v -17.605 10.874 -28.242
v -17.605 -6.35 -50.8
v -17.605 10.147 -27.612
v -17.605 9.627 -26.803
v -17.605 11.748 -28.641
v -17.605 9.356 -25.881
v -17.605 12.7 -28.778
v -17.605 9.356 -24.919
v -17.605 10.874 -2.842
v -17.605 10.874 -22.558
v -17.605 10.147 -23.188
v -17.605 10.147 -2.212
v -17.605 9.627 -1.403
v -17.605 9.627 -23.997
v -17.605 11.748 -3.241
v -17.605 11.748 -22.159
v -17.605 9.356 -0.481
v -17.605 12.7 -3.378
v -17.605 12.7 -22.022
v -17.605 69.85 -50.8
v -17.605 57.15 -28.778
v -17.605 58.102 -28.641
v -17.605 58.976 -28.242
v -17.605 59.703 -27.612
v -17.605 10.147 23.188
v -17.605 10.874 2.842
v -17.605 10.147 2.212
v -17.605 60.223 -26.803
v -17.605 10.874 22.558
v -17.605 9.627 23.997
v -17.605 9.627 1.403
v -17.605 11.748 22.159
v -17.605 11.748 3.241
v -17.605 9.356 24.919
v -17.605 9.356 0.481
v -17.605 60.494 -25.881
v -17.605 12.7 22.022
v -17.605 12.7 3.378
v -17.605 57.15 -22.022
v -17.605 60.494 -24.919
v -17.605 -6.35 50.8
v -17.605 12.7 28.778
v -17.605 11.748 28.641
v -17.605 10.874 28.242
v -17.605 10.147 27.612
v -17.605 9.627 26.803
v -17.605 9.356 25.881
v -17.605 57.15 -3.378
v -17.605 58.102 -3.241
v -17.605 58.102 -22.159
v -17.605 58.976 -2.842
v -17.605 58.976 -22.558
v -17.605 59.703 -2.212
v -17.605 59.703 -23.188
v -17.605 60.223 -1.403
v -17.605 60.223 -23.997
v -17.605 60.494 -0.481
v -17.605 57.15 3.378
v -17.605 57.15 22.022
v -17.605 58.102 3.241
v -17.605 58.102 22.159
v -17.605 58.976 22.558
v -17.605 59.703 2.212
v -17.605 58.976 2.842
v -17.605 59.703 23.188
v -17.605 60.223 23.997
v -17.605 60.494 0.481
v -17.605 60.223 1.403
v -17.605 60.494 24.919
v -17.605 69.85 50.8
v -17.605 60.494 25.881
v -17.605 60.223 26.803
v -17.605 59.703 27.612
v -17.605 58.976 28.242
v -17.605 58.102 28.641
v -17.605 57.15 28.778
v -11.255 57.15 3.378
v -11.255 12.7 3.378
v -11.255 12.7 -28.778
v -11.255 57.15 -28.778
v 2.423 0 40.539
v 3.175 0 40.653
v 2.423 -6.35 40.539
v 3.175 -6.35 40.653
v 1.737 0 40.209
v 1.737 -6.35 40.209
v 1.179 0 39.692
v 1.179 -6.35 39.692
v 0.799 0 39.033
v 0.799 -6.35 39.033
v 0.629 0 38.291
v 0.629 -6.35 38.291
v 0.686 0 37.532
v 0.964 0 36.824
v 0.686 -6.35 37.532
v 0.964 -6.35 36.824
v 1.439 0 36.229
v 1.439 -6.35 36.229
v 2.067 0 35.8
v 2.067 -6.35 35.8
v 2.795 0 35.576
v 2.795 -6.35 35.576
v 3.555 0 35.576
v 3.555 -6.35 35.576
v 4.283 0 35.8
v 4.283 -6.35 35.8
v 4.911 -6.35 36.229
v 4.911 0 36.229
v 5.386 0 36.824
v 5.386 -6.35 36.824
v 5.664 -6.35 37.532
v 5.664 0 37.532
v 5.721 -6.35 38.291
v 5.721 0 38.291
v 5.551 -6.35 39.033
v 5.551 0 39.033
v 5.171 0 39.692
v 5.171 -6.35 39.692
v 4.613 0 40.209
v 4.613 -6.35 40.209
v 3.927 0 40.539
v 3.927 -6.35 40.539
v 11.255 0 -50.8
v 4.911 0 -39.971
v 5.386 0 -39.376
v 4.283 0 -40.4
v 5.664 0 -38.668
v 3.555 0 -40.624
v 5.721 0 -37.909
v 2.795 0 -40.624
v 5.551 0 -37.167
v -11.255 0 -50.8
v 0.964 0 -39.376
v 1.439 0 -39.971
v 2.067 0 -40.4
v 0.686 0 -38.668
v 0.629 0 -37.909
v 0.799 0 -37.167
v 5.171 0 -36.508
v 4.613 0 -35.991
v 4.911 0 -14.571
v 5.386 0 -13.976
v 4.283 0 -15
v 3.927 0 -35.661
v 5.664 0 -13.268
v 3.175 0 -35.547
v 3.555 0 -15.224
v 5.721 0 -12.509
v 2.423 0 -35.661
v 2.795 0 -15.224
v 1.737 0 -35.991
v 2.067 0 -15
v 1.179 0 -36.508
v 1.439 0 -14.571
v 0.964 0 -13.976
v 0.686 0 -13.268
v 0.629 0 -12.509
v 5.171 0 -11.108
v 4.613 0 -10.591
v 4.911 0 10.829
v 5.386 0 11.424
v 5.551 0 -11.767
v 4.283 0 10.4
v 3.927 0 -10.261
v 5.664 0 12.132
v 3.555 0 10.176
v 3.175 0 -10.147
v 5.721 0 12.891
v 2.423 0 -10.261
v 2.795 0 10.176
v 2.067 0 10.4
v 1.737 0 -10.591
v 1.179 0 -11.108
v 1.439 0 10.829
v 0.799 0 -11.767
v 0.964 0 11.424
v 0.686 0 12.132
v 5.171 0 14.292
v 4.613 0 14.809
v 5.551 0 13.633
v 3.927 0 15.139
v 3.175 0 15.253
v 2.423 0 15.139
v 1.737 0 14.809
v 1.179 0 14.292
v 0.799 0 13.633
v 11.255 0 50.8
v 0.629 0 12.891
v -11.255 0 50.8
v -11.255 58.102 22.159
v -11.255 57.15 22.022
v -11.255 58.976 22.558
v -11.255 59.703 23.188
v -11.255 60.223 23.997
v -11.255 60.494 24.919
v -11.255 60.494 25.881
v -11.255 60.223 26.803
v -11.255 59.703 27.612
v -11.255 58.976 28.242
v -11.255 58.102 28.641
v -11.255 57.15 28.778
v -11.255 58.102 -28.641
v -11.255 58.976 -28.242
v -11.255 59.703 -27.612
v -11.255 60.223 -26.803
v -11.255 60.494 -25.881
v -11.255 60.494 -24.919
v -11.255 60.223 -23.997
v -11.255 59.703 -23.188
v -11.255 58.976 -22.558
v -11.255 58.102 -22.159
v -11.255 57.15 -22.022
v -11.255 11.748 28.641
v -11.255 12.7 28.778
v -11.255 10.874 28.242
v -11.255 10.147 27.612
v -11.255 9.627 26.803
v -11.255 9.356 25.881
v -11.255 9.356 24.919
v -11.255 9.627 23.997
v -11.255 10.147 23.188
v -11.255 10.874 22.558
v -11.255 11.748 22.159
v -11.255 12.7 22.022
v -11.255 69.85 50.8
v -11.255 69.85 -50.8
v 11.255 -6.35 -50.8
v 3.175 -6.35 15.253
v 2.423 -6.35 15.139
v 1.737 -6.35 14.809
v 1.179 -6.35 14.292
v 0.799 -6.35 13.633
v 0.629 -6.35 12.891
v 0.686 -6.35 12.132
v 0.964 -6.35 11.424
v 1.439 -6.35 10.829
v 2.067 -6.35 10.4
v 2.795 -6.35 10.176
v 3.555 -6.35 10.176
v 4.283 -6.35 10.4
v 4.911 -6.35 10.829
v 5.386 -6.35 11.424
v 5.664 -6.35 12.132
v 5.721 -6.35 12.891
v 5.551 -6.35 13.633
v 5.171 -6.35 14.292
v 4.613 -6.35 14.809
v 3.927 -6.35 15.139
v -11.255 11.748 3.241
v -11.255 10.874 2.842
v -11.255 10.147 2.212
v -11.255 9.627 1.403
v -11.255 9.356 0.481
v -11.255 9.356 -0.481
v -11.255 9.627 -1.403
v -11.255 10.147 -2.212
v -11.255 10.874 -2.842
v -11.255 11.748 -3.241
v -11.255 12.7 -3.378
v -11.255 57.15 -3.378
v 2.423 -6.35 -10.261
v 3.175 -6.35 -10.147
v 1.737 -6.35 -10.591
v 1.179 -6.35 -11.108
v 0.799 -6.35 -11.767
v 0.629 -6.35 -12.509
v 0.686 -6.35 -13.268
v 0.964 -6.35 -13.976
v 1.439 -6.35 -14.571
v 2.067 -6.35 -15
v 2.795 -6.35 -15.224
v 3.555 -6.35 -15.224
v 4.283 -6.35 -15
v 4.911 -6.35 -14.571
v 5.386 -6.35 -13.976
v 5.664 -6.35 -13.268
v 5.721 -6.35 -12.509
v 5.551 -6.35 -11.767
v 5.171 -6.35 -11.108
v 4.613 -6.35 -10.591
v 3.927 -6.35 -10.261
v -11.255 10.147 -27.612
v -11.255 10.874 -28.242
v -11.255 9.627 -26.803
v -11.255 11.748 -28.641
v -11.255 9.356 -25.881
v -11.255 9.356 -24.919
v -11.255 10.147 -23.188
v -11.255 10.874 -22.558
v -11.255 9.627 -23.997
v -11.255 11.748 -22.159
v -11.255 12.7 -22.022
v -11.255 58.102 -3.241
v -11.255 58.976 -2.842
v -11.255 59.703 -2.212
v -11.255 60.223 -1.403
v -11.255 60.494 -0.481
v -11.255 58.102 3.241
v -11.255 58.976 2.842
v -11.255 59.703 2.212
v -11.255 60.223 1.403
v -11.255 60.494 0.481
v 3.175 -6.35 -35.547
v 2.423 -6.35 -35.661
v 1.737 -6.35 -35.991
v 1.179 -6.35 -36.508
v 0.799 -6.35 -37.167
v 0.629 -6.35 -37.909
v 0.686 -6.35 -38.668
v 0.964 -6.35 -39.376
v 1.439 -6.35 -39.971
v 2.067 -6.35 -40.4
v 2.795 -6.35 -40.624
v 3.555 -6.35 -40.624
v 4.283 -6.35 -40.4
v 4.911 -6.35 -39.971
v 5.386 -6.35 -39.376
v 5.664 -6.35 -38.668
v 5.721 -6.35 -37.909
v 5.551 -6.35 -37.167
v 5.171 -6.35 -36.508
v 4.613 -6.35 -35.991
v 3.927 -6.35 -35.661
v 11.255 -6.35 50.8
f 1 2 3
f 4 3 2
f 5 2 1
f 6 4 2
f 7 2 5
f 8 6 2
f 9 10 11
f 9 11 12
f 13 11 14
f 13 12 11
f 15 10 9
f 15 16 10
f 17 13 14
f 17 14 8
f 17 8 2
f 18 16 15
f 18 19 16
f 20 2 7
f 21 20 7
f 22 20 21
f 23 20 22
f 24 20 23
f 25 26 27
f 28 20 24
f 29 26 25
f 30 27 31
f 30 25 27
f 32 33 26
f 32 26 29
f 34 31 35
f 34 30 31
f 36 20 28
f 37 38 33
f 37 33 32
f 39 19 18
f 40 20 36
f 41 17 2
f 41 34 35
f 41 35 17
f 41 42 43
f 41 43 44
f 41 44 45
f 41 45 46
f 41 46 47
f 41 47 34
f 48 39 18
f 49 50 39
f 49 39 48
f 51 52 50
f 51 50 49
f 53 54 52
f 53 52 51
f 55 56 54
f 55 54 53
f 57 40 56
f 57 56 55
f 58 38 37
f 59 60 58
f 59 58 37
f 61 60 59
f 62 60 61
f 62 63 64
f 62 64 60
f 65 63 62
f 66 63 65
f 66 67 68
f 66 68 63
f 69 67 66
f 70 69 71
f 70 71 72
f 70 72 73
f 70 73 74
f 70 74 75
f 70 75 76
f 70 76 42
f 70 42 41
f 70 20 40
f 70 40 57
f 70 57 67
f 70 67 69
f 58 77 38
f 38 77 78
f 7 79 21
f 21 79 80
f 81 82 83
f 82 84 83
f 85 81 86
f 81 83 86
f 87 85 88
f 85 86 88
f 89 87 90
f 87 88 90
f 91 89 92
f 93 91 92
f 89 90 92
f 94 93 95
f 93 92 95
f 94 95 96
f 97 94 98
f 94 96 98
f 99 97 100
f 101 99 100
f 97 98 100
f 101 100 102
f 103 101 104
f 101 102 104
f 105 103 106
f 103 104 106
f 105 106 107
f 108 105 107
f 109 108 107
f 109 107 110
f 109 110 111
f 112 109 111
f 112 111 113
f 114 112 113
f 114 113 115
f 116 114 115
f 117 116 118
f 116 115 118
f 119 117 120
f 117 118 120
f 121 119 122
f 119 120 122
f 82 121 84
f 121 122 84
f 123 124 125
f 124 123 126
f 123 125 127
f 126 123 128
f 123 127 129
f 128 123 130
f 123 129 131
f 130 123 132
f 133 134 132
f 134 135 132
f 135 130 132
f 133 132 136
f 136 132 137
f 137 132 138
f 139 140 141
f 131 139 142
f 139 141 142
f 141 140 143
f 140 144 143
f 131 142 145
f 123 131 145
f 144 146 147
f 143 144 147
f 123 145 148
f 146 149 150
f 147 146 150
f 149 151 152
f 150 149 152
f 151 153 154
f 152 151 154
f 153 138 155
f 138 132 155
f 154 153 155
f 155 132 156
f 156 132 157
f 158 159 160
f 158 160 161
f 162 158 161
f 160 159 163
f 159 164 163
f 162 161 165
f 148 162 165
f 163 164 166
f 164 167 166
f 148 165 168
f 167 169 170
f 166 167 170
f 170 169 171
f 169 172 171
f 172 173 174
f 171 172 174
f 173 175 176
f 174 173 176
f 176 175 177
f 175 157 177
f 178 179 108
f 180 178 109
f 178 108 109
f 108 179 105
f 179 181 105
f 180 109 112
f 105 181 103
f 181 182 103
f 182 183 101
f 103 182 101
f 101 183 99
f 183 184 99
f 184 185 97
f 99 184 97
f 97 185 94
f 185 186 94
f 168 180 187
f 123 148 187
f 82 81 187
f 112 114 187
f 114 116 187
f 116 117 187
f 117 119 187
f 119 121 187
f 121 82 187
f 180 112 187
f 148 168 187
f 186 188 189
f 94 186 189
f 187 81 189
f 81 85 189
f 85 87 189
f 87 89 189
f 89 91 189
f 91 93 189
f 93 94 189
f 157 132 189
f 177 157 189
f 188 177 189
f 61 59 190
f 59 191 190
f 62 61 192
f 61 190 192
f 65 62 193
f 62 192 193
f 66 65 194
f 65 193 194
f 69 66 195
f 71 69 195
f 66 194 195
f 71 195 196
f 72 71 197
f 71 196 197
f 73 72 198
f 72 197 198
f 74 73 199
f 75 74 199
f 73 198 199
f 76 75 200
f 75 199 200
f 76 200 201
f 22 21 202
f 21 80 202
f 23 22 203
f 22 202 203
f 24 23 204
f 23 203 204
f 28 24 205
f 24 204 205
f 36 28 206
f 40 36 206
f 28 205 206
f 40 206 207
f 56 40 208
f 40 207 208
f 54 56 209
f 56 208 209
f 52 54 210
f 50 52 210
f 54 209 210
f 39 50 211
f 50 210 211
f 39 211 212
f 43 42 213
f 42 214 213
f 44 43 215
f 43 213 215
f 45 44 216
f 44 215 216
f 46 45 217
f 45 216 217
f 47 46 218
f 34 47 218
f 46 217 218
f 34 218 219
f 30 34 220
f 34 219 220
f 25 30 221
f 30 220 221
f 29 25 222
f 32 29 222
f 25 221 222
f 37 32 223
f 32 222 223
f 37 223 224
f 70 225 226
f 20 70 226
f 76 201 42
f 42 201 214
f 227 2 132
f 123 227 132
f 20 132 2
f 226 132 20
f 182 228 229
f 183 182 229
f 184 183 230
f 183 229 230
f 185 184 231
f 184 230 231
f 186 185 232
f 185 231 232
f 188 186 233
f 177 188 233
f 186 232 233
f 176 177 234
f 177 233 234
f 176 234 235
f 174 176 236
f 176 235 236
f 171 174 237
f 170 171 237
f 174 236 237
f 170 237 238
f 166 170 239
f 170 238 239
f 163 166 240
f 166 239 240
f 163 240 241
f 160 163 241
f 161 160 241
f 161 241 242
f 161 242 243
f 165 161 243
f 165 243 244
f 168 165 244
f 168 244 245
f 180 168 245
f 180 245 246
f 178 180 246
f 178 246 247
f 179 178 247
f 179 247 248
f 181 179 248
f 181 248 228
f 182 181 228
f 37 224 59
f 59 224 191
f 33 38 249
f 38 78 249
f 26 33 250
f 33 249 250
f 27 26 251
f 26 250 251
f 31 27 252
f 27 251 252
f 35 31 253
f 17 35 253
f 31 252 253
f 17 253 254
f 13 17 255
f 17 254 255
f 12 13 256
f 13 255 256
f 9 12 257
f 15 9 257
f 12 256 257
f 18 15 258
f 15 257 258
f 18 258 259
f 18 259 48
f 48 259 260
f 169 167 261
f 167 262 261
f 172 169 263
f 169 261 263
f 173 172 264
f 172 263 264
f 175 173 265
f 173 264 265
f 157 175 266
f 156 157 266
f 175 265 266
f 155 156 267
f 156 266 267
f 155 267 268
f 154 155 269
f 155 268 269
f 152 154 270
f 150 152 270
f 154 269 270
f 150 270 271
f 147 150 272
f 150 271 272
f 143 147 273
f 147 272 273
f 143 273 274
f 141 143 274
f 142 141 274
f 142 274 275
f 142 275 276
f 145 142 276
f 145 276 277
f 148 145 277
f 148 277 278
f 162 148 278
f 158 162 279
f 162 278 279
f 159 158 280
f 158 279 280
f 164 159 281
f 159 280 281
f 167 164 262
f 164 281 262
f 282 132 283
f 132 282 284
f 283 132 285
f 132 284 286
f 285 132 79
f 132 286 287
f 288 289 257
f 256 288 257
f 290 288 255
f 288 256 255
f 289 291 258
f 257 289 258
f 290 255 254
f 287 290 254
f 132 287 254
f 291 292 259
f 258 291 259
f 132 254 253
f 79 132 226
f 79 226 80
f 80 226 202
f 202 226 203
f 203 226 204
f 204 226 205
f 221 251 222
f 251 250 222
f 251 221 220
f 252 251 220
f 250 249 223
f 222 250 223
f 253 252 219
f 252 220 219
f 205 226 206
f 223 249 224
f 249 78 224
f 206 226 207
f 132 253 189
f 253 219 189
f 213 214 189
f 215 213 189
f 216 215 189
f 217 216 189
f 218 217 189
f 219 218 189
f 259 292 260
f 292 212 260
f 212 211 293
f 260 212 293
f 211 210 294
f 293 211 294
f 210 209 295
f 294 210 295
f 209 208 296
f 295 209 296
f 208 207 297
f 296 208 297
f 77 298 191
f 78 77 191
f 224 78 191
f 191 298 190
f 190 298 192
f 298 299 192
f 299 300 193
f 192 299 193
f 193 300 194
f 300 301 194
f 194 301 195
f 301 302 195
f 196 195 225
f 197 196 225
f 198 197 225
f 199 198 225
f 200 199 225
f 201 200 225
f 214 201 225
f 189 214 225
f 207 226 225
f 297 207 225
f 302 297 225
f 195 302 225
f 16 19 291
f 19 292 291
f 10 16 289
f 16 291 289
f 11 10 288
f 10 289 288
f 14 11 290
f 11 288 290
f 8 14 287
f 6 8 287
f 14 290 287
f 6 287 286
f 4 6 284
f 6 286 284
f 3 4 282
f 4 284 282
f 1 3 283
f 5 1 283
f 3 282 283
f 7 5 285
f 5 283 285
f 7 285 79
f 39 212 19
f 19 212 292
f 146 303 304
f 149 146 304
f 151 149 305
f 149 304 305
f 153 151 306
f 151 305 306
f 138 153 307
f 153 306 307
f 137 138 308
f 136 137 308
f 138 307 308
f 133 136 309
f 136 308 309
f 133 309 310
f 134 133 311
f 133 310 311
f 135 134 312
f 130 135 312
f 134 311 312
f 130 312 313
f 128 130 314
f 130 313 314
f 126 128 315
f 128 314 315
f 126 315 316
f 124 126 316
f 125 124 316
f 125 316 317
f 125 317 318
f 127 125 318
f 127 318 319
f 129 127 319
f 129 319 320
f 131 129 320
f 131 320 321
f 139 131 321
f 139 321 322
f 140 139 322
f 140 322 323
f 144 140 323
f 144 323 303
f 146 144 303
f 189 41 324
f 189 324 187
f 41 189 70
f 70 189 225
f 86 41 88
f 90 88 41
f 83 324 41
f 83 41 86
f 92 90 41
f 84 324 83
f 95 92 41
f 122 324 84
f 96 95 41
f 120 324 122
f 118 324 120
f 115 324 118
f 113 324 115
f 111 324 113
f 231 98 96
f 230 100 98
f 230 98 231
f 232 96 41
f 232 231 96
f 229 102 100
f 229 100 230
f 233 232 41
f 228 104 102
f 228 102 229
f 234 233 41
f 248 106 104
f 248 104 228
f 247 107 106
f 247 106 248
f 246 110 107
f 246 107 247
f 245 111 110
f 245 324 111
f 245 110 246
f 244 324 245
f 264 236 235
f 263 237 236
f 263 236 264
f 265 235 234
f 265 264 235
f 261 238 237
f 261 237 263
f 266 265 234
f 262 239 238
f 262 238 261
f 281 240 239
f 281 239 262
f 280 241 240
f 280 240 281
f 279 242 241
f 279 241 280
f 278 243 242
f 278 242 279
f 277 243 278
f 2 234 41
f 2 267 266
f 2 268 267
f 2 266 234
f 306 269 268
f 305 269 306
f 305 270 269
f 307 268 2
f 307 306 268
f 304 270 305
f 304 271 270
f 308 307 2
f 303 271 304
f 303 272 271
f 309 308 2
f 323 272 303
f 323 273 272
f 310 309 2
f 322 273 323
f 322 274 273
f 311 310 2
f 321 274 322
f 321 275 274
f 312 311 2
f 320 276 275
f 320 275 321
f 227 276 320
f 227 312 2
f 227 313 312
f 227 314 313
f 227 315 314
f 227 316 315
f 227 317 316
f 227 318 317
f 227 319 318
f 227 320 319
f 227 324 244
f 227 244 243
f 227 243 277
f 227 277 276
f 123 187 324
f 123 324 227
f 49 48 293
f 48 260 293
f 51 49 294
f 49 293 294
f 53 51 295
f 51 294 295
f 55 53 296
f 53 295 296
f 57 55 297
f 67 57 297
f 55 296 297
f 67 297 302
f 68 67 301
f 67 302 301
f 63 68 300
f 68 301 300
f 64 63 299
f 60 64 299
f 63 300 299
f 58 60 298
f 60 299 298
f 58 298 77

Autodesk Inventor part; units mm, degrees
ref_plane "YZ Plane" through (0, 0, 0) normal (1, 0, 0) x (0, 1, 0)
ref_plane "XZ Plane" through (0, 0, 0) normal (0, 1, 0) x (-1, 0, 0)
sketch "Sketch1" plane through (0, 0, 0) normal (0, 1, 0) x (-1, 0, 0)
  line L0 (11.2547, 50.8) -> (-11.2547, 50.8)
  line L1 (-11.2547, 50.8) -> (-11.2547, -50.8)
  line L2 (-11.2547, -50.8) -> (11.2547, -50.8)
  line L3 (11.2547, -50.8) -> (11.2547, 50.8)
  line L4 (11.2547, 50.8) -> (-11.2547, -50.8) construction
  line L5 (-11.2547, 50.8) -> (11.2547, -50.8) construction
  point P0 (0, 0)
  dimension "d0" = 101.6
  dimension "d1" = 22.5095
extrude "Extrusion1" add sketch "Sketch1" against normal blind 6.35
sketch "Sketch2" plane through (0, 0, 0) normal (0, 1, 0) x (1, 0, 0)
  line L0 (11.2547, -50.8) -> (-11.2547, -50.8) projected
  line L1 (-11.2547, 50.8) -> (11.2547, 50.8) projected
  line L2 (-11.2547, -50.8) -> (-4.9047, -50.8)
  line L3 (-4.9047, -50.8) -> (-4.9047, 50.8)
  line L4 (-4.9047, 50.8) -> (-11.2547, 50.8)
  line L5 (-11.2547, 50.8) -> (-11.2547, -50.8)
  point P0 (0, 0)
  dimension "d4" = 6.35
extrude "Extrusion2" add sketch "Sketch2" along normal blind 76.2
sketch "Sketch4" plane through (0, 0, 0) normal (0, 1, 0) x (1, 0, 0)
  line L0 (-4.9047, -50.8) -> (11.2547, -50.8) construction
  line L1 (3.175, -50.8) -> (3.175, 50.8) construction
  line L2 (-11.2547, 50.8) -> (11.2547, 50.8) construction
  point P0 (0, 0)
  point P1 (3.175, -38.1)
  point P2 (3.175, -12.7)
  point P3 (3.175, 12.7)
  point P4 (3.175, 38.1)
  dimension "d11" = 12.7
  dimension "d14" = 25.4
hole "Hole1" at (3.175, 0, 38.1) at (3.175, 0, 12.7) at (3.175, 0, -12.7) at (3.175, 0, -38.1) direction (0, -1, 0) diameter 5.1054 end through all clearance for "Hex Machine Screw" size "#10" standard "Ansi Unified Screw Threads"
ref_plane "Work Plane1" through (-11.2547, -6.35, -50.8) normal (-1, 0, 0) x (0, 0, 1)
sketch "Sketch7" plane through (-11.2547, -6.35, -50.8) normal (-1, 0, 0) x (0, 0, 1)
  line L0 (0, 6.35) -> (101.6, 6.35) projected
  line L1 (0, 82.55) -> (101.6, 82.55) projected
  line L2 (101.6, 0) -> (101.6, 82.55) projected
  line L3 (0, 0) -> (0, 82.55) projected
  line L4 (101.6, 6.35) -> (101.6, 82.55) projected
  line L5 (0, 6.35) -> (101.6, 6.35)
  line L6 (101.6, 6.35) -> (101.6, 82.55)
  line L7 (101.6, 82.55) -> (0, 82.55)
  line L8 (0, 82.55) -> (0, 6.35)
  point P0 (50.8, 6.35)
extrude "Extrusion5" cut sketch "Sketch7" against normal through all
sketch "Sketch8" plane through (-11.2547, -6.35, -50.8) normal (-1, 0, 0) x (0, 0, 1)
  line L0 (0, 0) -> (0, 6.35) projected
  line L1 (101.6, 0) -> (101.6, 6.35) projected
  line L2 (101.6, 0) -> (0, 0) projected
  line L3 (0, 0) -> (101.6, 0)
  line L4 (101.6, 0) -> (101.6, 76.2)
  line L5 (101.6, 76.2) -> (0, 76.2)
  line L6 (0, 76.2) -> (0, 0)
  point P0 (50.8, 6.35)
  dimension "d51" = 76.2
extrude "Extrusion6" add sketch "Sketch8" along normal blind 6.35
sketch "Sketch9" plane through (-11.2547, -6.35, -50.8) normal (1, 0, 0) x (0, 0, -1)
  line L0 (-101.6, 76.2) -> (0, 76.2) projected
  line L1 (0, 76.2) -> (0, 0) projected
  line L2 (-101.6, 0) -> (-101.6, 76.2) projected
  line L3 (0, 0) -> (-101.6, 0) projected
  line L4 (-76.2, 63.5) -> (-76.2, 19.05) construction
  line L5 (-79.5782, 63.5) -> (-79.5782, 19.05)
  line L6 (-72.8218, 19.05) -> (-72.8218, 63.5)
  arc A0 (-72.8218, 63.5) -> (-79.5782, 63.5) centre (-76.2, 63.5) ccw
  arc A1 (-79.5782, 19.05) -> (-72.8218, 19.05) centre (-76.2, 19.05) ccw
  line L7 (-101.6, 63.5) -> (0, 63.5) construction
  line L8 (-101.6, 19.05) -> (0, 19.05) construction
  line L9 (-50.8, 63.5) -> (-50.8, 19.05) construction
  line L10 (-54.1782, 63.5) -> (-54.1782, 19.05)
  line L11 (-47.4218, 19.05) -> (-47.4218, 63.5)
  arc A2 (-47.4218, 63.5) -> (-54.1782, 63.5) centre (-50.8, 63.5) ccw
  arc A3 (-54.1782, 19.05) -> (-47.4218, 19.05) centre (-50.8, 19.05) ccw
  line L12 (-25.4, 63.5) -> (-25.4, 19.05) construction
  line L13 (-28.7782, 63.5) -> (-28.7782, 19.05)
  line L14 (-22.0218, 19.05) -> (-22.0218, 63.5)
  arc A4 (-22.0218, 63.5) -> (-28.7782, 63.5) centre (-25.4, 63.5) ccw
  arc A5 (-28.7782, 19.05) -> (-22.0218, 19.05) centre (-25.4, 19.05) ccw
  point P0 (-50.8, 6.35)
  point P1 (-76.2, 41.275)
  point P2 (-50.8, 41.275)
  point P3 (-25.4, 41.275)
  dimension "d54" = 25.4
  dimension "d55" = 12.7
  dimension "d56" = 19.05
  dimension "d58" = 6.7564
  dimension "d59" = 25.4
extrude "Extrusion7" cut sketch "Sketch9" against normal through all contours A0 L6 A1 L5 | A2 L11 A3 L10 | A4 L14 A5 L13
equation "\"d0\" = BaseLength"
equation "\"d1\" = BaseWidth"
equation "\"d2\" = BaseThickness"
equation "\"d4\" = BackWidth"
equation "\"d5\" = BackHeight"
equation "\"d11\" = offsetForFirstHole"
equation "\"d54\" = deltaForSlots"
equation "\"BaseWidth\" = 22.50948"
equation "\"BaseLength\" = 101.6"
equation "\"BaseThickness\" = 6.35"
equation "\"BackWidth\" = 6.35"
equation "\"BackHeight\" = 76.2"
equation "\"TopBackExtension\" = 50.8"
equation "\"TopFrontExtension\" = 50.8"
equation "\"TopThickness\" = 6.35"
equation "\"offsetForFirstHole\" = 12.7"
equation "\"holeSpacingForMotorBracket\" = 76.2"
equation "\"offsetForBracketHoleFromEdge\" = 6.35"
equation "\"holeSpacingForVariationInMotorBracketHoles\" = 19.05"
equation "\"deltaForSlots\" = 0.25 * BaseLength"
properties part number "pullyBracketLowerPortion" material "PC/ABS Plastic"
